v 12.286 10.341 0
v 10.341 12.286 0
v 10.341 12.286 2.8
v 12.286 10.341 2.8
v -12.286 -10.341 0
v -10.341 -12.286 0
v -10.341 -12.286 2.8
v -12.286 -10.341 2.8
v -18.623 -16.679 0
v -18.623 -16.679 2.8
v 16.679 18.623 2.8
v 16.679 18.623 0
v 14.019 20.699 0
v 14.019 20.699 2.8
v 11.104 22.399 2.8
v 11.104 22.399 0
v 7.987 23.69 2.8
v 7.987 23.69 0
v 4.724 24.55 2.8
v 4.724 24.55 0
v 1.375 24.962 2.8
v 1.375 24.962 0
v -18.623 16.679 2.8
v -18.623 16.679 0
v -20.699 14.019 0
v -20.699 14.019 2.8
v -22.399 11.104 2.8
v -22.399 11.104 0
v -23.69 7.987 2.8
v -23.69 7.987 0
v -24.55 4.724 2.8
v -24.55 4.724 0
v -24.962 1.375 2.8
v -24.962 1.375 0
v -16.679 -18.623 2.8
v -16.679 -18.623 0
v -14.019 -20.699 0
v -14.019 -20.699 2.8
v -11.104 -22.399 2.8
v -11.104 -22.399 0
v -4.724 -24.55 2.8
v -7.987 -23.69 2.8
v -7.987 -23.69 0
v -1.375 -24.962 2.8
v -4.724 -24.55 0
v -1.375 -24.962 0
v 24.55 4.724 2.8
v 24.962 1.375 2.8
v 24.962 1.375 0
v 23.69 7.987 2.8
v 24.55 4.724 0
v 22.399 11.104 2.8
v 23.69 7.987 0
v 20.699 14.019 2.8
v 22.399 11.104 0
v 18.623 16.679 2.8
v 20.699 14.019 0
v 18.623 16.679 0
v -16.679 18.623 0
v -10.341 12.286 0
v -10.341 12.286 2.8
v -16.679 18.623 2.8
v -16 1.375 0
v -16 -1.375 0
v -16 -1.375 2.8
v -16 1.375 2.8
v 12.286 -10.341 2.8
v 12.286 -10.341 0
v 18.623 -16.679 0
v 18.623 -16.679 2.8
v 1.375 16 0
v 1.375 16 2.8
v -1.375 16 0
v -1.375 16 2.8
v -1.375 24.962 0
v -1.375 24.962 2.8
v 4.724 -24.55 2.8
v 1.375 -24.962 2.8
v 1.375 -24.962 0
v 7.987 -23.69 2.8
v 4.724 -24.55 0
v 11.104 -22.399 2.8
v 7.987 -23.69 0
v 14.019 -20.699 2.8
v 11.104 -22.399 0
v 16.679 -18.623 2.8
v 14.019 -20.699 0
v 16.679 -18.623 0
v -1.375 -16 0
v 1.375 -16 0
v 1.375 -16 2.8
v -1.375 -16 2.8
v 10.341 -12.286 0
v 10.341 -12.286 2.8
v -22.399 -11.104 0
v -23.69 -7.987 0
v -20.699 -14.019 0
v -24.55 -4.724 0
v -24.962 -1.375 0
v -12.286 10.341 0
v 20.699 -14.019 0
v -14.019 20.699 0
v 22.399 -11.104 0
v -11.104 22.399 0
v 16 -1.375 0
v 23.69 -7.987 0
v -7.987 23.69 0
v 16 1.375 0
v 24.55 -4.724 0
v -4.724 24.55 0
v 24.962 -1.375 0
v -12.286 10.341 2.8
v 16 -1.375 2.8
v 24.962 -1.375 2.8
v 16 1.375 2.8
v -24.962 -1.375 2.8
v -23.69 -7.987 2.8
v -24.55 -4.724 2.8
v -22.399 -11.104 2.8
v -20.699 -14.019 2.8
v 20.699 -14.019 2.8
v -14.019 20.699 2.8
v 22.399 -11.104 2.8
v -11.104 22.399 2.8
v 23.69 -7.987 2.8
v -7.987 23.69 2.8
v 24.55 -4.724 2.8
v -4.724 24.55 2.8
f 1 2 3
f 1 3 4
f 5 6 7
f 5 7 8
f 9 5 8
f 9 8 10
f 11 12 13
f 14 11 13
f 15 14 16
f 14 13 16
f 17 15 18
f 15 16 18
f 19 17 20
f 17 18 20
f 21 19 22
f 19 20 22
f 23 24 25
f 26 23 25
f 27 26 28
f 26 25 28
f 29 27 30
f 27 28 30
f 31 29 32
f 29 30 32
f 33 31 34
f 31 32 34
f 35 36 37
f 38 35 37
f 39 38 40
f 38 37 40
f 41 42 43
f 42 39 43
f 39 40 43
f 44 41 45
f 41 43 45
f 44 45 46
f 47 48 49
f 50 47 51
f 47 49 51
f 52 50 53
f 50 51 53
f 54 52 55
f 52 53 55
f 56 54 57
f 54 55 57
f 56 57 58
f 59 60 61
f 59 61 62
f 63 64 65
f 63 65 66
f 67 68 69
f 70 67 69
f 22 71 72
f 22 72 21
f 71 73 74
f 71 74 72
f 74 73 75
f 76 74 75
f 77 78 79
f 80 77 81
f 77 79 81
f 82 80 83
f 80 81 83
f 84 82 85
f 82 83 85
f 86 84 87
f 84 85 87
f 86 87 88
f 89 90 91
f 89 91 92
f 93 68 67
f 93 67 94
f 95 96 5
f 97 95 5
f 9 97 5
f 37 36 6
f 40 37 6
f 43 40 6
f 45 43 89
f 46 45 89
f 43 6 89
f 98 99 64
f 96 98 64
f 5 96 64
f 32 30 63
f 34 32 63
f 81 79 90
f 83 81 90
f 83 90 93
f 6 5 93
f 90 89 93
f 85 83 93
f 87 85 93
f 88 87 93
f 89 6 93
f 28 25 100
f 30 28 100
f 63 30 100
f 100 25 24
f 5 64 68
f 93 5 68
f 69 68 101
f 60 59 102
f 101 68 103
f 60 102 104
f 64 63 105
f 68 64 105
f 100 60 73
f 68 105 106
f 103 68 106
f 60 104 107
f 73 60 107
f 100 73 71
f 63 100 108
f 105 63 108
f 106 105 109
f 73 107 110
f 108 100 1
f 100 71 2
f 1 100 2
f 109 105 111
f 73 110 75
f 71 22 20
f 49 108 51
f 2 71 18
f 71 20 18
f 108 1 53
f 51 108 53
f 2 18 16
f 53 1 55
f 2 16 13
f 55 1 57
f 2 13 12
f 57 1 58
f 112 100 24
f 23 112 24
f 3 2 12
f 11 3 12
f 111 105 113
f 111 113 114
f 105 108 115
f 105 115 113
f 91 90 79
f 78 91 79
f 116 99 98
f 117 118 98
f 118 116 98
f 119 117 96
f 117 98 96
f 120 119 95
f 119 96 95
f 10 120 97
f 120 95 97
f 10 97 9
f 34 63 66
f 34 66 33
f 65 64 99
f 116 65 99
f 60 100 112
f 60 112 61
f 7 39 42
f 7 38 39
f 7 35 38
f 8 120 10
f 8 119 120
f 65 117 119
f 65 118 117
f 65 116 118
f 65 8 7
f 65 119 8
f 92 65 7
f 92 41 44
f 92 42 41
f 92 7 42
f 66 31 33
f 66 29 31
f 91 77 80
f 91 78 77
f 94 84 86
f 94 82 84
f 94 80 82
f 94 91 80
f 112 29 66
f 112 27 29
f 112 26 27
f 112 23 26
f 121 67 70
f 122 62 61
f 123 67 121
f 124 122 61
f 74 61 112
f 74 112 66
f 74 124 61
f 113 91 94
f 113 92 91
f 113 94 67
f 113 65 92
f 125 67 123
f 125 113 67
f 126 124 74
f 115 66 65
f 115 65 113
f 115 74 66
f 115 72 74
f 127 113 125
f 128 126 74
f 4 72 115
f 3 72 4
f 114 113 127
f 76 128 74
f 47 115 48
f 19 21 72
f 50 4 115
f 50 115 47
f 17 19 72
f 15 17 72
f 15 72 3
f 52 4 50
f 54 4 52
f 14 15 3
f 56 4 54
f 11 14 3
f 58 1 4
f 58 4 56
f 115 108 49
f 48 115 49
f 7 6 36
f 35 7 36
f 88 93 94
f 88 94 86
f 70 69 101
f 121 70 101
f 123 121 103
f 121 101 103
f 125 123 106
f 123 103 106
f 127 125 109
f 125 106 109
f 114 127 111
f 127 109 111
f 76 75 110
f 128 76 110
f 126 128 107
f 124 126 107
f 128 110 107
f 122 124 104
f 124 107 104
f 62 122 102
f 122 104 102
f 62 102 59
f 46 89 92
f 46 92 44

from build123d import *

# Parameters (mm, degrees)
CROQUIS1_R              = 25
SALIENTE_EXTRUIR1_DEPTH = 2.8
CROQUIS2_W              = 2.75
CROQUIS2_H              = 18
CORTAR_EXTRUIR1_DEPTH   = 3.8
MATRIZC1_COUNT          = 8


with BuildPart() as part:
    # Croquis1 → Saliente-Extruir1 (new body)
    with BuildSketch(Plane.XY):
        Circle(CROQUIS1_R)
    extrude(amount=SALIENTE_EXTRUIR1_DEPTH)

    # Croquis2 → Cortar-Extruir1 (cut, through all)
    with BuildSketch(Plane.XY):
        with Locations((0, 25)):
            Rectangle(CROQUIS2_W, CROQUIS2_H)
    cortar_extruir1 = extrude(amount=CORTAR_EXTRUIR1_DEPTH, mode=Mode.SUBTRACT)

    # MatrizC1: Cortar-Extruir1 ×8 about axis
    matrizc1_axis = Axis((0, 0, 0), (0, 0, 1))
    for i in range(1, MATRIZC1_COUNT):
        add(cortar_extruir1.rotate(matrizc1_axis, i * 360 / MATRIZC1_COUNT), mode=Mode.SUBTRACT)


solid = part.part
